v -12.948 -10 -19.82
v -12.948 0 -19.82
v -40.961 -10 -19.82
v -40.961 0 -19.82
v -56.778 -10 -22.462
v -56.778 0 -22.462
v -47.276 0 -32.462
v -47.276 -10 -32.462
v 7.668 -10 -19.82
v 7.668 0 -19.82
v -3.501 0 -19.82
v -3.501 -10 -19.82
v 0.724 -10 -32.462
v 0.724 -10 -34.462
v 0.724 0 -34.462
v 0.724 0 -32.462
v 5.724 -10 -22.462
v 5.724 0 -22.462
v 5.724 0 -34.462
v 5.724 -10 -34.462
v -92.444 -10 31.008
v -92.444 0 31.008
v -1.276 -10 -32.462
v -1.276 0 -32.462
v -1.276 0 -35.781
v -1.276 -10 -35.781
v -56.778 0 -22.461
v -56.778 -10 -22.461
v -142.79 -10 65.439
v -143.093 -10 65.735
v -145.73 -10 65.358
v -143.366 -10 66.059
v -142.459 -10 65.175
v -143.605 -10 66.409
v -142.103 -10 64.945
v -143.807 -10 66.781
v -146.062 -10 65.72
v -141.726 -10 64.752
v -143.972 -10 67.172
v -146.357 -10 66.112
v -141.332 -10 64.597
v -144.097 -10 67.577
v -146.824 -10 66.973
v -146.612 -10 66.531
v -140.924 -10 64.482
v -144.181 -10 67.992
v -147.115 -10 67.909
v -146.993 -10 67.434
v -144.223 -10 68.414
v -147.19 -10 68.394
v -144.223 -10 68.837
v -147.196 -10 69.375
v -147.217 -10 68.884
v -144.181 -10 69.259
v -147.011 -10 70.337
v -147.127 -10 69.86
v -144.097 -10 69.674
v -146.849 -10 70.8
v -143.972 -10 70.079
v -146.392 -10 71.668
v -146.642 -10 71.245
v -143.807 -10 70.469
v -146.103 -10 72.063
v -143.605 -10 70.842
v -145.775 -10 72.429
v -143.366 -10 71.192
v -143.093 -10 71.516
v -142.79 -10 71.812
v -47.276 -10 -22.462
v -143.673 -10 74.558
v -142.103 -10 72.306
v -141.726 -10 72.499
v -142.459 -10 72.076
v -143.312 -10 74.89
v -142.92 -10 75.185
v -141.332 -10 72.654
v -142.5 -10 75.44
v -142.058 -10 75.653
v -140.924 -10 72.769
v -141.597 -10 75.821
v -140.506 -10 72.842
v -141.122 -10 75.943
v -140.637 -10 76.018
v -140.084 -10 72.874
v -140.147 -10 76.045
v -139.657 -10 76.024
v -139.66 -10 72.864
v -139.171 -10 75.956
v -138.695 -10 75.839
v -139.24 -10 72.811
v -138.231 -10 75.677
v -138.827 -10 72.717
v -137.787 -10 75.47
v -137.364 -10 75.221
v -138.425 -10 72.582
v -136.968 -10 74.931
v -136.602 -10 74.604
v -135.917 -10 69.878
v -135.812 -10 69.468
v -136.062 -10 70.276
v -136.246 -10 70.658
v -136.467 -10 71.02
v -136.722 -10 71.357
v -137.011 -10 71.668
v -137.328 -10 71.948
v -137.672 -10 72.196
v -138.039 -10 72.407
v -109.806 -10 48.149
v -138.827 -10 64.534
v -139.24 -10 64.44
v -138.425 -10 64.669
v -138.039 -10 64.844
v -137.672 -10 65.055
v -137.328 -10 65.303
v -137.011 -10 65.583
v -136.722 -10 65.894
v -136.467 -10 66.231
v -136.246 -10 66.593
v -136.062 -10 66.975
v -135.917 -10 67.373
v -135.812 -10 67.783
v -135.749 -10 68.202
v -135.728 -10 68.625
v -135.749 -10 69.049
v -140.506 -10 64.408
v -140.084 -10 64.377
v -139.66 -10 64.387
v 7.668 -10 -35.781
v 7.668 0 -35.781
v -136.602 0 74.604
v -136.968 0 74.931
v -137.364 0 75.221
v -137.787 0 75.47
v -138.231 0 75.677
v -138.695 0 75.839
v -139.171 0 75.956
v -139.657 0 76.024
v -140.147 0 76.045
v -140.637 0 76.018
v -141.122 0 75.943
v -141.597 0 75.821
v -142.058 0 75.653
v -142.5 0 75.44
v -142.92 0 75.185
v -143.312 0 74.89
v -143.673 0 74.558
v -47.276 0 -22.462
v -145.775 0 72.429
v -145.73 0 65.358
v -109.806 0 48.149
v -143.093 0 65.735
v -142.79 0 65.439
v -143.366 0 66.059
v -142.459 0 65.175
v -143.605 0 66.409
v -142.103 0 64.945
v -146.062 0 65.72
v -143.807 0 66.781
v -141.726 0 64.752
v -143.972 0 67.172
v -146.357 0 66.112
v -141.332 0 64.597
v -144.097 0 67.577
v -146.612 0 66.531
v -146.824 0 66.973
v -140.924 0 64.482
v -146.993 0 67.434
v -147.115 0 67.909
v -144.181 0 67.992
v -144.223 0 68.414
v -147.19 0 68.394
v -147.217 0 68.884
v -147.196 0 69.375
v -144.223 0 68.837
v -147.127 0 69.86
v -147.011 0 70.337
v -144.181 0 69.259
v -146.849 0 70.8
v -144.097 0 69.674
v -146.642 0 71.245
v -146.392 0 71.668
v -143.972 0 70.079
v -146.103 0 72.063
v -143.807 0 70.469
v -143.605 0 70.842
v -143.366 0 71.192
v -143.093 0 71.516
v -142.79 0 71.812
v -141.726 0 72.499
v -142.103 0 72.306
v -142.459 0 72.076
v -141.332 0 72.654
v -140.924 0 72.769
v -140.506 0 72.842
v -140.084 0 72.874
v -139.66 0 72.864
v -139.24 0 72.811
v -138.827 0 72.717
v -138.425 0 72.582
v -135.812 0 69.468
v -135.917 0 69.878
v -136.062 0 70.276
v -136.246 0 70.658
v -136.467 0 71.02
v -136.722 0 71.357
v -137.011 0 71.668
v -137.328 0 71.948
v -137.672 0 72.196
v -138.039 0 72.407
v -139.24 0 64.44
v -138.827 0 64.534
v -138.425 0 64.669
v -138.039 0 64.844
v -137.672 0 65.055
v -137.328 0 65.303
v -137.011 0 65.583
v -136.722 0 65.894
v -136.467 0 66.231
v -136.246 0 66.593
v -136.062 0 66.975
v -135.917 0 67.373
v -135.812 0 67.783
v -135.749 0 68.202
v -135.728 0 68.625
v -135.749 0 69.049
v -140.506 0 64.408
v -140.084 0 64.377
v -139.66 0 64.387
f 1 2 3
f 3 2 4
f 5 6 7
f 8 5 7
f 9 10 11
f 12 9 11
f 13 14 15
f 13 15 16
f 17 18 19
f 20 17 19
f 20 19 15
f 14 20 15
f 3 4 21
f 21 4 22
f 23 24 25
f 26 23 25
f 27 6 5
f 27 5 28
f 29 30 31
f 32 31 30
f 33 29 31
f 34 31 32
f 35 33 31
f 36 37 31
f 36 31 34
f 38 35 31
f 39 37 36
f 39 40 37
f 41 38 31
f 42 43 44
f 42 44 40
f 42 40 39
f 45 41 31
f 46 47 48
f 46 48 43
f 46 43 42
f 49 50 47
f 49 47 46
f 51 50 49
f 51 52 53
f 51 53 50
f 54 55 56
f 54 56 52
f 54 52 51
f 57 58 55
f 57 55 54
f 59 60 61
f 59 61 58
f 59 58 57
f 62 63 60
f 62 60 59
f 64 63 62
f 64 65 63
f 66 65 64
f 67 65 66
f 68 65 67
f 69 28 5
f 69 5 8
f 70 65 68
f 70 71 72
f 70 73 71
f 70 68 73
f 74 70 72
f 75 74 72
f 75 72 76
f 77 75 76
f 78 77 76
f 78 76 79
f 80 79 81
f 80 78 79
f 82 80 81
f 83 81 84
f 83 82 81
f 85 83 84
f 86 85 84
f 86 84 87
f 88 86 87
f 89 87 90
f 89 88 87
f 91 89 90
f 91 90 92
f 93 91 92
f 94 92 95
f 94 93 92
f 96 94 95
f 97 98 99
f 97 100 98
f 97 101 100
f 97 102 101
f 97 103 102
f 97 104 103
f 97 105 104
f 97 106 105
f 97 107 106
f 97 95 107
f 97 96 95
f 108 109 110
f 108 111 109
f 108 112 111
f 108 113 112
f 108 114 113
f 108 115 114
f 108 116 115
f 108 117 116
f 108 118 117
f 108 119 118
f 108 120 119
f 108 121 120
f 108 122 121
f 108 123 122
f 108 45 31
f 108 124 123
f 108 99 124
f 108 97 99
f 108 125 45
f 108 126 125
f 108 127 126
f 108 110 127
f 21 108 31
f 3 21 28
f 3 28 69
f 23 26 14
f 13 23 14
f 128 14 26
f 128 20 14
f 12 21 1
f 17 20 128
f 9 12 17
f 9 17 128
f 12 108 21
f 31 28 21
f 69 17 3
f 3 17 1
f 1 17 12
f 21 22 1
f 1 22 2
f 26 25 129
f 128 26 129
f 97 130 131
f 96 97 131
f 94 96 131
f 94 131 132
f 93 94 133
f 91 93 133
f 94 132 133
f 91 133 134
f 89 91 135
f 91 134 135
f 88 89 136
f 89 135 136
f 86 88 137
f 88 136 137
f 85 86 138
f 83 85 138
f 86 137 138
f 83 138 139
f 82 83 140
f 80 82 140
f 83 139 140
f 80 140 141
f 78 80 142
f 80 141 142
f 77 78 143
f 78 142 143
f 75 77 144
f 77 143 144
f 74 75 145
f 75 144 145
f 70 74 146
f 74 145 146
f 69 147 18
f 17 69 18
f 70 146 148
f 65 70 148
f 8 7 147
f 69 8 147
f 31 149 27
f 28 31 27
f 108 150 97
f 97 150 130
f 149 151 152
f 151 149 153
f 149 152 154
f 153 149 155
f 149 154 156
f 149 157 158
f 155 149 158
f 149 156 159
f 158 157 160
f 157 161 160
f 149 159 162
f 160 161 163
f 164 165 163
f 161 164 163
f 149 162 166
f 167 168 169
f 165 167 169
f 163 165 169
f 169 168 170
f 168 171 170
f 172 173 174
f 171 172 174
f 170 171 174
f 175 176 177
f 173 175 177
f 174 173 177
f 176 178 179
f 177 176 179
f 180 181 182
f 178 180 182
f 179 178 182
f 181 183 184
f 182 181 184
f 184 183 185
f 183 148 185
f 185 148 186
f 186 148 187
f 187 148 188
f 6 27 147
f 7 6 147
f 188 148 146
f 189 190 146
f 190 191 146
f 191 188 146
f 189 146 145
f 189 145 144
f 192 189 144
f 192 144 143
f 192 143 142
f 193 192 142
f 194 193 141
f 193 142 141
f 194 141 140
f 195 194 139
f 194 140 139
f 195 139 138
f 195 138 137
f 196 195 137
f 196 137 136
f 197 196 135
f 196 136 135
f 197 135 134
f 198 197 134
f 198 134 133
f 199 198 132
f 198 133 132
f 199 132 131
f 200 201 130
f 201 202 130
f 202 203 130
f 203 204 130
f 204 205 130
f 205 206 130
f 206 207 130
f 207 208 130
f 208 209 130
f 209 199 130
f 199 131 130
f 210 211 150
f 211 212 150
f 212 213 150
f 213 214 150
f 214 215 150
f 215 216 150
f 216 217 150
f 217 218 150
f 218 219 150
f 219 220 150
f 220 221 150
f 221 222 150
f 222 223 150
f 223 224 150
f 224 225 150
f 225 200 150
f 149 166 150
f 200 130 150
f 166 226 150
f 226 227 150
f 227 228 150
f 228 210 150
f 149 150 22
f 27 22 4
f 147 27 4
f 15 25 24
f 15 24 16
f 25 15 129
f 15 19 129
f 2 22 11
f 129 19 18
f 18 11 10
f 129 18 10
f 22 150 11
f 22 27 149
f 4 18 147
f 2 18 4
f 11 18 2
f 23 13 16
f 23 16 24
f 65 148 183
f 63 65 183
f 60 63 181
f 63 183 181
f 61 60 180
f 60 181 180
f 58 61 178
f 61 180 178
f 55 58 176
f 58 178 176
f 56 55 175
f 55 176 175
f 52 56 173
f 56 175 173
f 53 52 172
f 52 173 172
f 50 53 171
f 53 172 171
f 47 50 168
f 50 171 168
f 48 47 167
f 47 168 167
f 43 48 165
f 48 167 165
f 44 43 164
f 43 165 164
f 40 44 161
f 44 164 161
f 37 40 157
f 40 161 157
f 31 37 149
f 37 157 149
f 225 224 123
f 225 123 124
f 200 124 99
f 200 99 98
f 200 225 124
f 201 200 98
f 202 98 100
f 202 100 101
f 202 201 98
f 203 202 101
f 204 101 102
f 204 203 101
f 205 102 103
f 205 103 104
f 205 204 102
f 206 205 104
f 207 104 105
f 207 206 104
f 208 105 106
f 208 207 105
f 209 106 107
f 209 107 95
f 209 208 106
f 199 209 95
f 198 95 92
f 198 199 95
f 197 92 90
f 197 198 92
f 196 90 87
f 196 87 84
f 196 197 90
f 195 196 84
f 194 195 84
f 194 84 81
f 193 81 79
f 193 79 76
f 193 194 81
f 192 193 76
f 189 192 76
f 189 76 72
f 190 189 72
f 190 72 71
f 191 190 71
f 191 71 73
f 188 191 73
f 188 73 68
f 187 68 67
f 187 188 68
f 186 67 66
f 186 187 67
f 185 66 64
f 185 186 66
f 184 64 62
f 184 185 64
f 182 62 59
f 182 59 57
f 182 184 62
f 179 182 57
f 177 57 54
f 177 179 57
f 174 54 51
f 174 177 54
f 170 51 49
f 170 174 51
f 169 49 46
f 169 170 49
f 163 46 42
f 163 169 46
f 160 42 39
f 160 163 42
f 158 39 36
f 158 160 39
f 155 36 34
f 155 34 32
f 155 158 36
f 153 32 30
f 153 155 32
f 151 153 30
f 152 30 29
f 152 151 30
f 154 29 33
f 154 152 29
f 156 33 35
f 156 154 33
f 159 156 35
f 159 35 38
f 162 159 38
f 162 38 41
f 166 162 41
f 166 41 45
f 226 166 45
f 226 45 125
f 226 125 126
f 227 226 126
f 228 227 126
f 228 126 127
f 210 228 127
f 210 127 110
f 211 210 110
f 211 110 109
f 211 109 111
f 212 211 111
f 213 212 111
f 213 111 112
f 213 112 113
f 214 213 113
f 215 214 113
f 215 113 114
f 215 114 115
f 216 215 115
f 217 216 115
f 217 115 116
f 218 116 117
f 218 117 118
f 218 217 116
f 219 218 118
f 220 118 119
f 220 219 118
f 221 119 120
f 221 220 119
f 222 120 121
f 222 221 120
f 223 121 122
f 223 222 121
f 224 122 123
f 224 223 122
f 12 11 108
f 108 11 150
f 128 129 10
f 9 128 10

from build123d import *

# Parameters (mm, degrees)
F0_W     = 9.5021461621
F0_H     = 2.6417713279
F2_DEPTH = 10
F1_R     = 4.25
F4_DEPTH = 10


with BuildPart() as f2:
    # F0 (on Front) → F2 (new body)
    with BuildSketch(Plane.XZ):
        Polygon((-1.2758228406, -32.4617078483), (-1.2758228406, -35.7812091163), (7.6683001402, -35.7812091163), (7.6683001402, -19.8199365203), (-47.2758228406, -19.8199365203), (-47.2758228406, -22.4617078483), (5.7241771594, -22.4617078483), (5.7241771594, -34.4617078483), (0.7241771594, -34.4617078483), (0.7241771594, -32.4617078483), align=None)
        with Locations((-52.0268959217, -21.1408221843)):
            Rectangle(F0_W, F0_H)
        Polygon((-47.2758228406, -32.4617078483), (-47.2758228406, -22.4617078483), (-56.7779690027, -22.4617078483), align=None)
    extrude(amount=F2_DEPTH)



with BuildPart() as f2b:
    # F1 (on Front) → F2, piece 2 (new body)
    with BuildSketch(Plane.XZ):
        with BuildLine():
            Line((-145.7300181234, 65.3582332276), (-56.7768959217, -22.4617078483))
            Line((-56.7768959217, -22.4617078483), (-40.5840538442, -20.1916061342))
            Line((-40.5840538442, -20.1916061342), (-136.6024373877, 74.6035913392))
            ThreePointArc((-136.6024373877, 74.6035913392), (-140.1472862331, 76.0453637221), (-143.6733599188, 74.5582640942))
            Line((-143.6733599188, 74.5582640942), (-145.7753453684, 72.4291557587))
            ThreePointArc((-145.7753453684, 72.4291557587), (-147.2171177514, 68.8843069133), (-145.7300181234, 65.3582332276))
        make_face()
        with Locations((-139.9780238936, 68.6254584758)):
            Circle(F1_R, mode=Mode.SUBTRACT)
    extrude(amount=F2_DEPTH)


with BuildPart() as f2_1:
    add(f2.part)

    add(f2b.part)  # F4 merges F2b
    # F3 (on Front) → F4 (join)
    with BuildSketch(Plane.XZ):
        Polygon((-2.4996690918, -20.4601678997), (-118.4480087704, 53.6740520599), (-116.2248924375, 46.2126098573), (-11.9464918971, -20.4601678997), align=None)
    extrude(amount=F4_DEPTH)


solid = f2_1.part
